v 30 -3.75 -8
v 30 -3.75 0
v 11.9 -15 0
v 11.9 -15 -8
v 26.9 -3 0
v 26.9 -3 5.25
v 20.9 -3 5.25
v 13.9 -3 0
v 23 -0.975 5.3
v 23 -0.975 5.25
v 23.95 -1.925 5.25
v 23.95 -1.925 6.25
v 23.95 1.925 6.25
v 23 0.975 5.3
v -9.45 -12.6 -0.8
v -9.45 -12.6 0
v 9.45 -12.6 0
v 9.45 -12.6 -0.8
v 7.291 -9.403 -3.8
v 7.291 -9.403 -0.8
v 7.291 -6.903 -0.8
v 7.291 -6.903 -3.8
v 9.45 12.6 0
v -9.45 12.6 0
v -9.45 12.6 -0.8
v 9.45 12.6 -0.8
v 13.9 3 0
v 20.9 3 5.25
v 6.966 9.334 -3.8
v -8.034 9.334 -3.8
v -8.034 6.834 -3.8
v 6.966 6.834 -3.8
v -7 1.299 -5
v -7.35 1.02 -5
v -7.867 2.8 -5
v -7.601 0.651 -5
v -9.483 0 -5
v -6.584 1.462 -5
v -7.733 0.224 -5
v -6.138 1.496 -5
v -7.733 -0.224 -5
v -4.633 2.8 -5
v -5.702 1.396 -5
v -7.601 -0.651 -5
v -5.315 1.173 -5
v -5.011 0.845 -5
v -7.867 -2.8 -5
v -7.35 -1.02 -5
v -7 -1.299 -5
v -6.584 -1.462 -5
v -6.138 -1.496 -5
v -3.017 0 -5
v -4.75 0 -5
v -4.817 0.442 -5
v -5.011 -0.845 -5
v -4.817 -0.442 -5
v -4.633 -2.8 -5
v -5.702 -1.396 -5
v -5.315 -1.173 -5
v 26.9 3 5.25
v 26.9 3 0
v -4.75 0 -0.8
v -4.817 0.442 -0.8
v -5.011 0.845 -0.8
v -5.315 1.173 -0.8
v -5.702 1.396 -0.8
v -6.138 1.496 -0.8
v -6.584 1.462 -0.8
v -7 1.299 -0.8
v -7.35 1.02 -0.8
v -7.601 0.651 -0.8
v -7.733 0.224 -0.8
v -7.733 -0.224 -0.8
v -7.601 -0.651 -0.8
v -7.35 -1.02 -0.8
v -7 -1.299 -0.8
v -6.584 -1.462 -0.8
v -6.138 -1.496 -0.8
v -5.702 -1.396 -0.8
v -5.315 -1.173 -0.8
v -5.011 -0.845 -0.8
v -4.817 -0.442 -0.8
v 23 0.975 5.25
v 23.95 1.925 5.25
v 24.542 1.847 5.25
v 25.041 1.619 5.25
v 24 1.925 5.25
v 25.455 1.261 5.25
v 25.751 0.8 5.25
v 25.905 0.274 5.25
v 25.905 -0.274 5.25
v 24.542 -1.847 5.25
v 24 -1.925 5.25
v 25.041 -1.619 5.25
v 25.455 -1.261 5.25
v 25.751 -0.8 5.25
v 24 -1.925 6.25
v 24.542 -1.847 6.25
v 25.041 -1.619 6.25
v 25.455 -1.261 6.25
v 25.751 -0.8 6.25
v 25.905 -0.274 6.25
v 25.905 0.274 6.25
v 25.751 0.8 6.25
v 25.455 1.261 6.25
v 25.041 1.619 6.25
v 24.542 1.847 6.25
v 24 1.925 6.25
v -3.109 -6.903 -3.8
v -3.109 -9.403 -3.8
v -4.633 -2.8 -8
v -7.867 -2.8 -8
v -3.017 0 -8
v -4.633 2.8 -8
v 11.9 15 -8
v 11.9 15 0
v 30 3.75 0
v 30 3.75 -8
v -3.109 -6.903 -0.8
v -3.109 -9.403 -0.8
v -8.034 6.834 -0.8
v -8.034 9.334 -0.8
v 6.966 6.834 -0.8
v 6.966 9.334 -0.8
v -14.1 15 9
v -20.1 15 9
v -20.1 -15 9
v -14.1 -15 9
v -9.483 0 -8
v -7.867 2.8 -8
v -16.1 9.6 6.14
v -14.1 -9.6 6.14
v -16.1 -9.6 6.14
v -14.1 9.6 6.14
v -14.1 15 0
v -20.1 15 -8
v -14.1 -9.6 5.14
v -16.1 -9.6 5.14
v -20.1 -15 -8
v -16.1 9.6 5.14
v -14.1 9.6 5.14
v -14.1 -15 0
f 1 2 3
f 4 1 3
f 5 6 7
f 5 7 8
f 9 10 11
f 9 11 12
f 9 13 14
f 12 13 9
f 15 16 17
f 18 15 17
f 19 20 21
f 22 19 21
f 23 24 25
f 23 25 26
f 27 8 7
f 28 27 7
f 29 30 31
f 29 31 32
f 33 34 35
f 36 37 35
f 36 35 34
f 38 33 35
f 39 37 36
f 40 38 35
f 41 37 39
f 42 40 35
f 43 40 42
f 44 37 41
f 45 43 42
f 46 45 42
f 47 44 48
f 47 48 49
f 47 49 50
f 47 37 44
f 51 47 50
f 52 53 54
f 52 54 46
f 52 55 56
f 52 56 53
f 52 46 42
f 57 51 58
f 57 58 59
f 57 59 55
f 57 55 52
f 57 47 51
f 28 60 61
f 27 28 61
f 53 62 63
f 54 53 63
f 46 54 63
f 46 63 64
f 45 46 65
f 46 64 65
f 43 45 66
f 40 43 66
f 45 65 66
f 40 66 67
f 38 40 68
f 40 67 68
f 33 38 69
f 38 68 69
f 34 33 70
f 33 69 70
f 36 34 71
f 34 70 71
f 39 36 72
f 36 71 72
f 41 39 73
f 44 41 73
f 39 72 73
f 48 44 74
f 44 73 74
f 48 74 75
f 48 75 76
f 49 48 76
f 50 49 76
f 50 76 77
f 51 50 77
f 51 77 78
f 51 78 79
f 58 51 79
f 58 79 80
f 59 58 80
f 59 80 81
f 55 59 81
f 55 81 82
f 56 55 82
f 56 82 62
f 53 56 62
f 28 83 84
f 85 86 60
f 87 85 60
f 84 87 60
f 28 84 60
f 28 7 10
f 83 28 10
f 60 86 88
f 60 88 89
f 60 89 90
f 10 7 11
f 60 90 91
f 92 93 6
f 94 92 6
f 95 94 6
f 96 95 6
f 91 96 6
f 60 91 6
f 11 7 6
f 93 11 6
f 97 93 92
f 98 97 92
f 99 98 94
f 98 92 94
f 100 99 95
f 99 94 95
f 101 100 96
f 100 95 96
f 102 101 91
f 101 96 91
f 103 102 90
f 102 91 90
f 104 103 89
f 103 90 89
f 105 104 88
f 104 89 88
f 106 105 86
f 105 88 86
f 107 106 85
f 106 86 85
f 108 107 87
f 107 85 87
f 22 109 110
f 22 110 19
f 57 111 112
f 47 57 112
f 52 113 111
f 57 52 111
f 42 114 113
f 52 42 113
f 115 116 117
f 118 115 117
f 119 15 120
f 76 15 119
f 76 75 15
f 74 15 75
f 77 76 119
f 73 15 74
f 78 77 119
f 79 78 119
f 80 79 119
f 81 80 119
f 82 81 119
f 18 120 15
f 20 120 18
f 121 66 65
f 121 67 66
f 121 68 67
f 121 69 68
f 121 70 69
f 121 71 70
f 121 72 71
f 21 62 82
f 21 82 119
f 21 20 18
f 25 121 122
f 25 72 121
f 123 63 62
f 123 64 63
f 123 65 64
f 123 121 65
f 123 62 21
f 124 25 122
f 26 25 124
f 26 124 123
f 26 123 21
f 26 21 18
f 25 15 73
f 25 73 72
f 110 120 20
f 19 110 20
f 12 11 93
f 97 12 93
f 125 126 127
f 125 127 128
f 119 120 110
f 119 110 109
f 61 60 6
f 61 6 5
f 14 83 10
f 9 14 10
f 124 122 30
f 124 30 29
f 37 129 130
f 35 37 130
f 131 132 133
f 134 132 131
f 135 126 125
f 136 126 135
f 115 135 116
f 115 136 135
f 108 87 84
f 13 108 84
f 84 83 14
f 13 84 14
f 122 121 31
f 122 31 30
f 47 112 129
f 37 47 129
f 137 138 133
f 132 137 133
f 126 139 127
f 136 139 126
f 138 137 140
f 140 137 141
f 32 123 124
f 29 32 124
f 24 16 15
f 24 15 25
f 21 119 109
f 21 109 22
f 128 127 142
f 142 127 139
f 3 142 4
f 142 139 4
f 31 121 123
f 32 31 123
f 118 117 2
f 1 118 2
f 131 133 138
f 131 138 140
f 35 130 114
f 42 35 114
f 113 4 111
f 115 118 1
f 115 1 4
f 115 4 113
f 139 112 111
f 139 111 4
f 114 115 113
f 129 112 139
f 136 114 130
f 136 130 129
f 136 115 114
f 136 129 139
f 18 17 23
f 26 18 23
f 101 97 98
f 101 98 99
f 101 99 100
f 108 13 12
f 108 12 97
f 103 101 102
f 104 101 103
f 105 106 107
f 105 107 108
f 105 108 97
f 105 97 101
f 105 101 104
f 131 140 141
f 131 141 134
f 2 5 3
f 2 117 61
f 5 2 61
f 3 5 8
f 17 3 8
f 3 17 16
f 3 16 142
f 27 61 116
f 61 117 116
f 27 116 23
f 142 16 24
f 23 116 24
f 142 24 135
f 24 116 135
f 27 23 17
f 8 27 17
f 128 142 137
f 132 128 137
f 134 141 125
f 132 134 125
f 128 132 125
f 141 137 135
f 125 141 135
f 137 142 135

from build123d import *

# Parameters (mm, degrees)
SKETCH_R          = 1.5
PAD_DEPTH         = 8
SKETCH001_W       = 18.9
SKETCH001_H       = 25.2
POCKET_DEPTH      = 0.8
SKETCH002_W       = 15
SKETCH002_H       = 2.5
SKETCH002_W_2     = 10.4
POCKET001_DEPTH   = 3
SKETCH003_W       = 6
SKETCH003_H       = 30
PAD001_DEPTH      = 9
SKETCH004_W       = 19.2
SKETCH004_H       = 1
POCKET002_DEPTH   = 2
POCKET003_DEPTH   = 3
PAD002_DEPTH      = 3
PAD002_DEPTH_BACK = 3
PAD003_DEPTH      = 1
CHAMFER_SIZE      = 0.95


with BuildPart() as part:
    # Sketch → Pad (new body)
    with BuildSketch(Plane.XY):
        Polygon((-20.1, 15), (11.9, 15), (30, 3.75), (30, -3.75), (11.9, -15), (-20.1, -15), align=None)
        with Locations((-6.25, 0)):
            Circle(SKETCH_R, mode=Mode.SUBTRACT)
    extrude(amount=-PAD_DEPTH)

    # Sketch001 → Pocket (cut)
    with BuildSketch(Plane.XY):
        Rectangle(SKETCH001_W, SKETCH001_H)
    extrude(amount=-POCKET_DEPTH, mode=Mode.SUBTRACT)

    # Sketch002 (on Face33 of Pad003) → Pocket001 (cut)
    with BuildSketch(Plane.XY.offset(-0.8)):
        with Locations((-0.534042, 8.083783)):
            Rectangle(SKETCH002_W, SKETCH002_H)
        with Locations((2.090713, -8.153236)):
            Rectangle(SKETCH002_W_2, SKETCH002_H)
    extrude(amount=-POCKET001_DEPTH, mode=Mode.SUBTRACT)

    # Sketch003 (on Face4 of Pocket001) → Pad001 (join)
    with BuildSketch(Plane.XY):
        with Locations((-17.1, 0)):
            Rectangle(SKETCH003_W, SKETCH003_H)
    extrude(amount=PAD001_DEPTH)

    # Sketch004 (on Face10 of Pad001) → Pocket002 (cut)
    with BuildSketch(Plane.YZ.offset(-14.1)):
        with Locations((0, 5.64)):
            Rectangle(SKETCH004_W, SKETCH004_H)
    extrude(amount=-POCKET002_DEPTH, mode=Mode.SUBTRACT)

    # Sketch005 → Pocket003 (cut)
    with BuildSketch(Plane(origin=(0, 0, -8), x_dir=(1, 0, 0), z_dir=(0, 0, -1))):
        Polygon((-4.633419, 2.8), (-7.866581, 2.8), (-9.483162, 0), (-7.866581, -2.8), (-4.633419, -2.8), (-3.016838, 0), align=None)
    extrude(amount=-POCKET003_DEPTH, mode=Mode.SUBTRACT)

    # Sketch006 → Pad002 (join, two sides)
    with BuildSketch(Plane.XZ) as pad002_sk:
        Polygon((13.9, 0), (20.9, 5.25), (26.9, 5.25), (26.9, 0), align=None)
    extrude(amount=PAD002_DEPTH)
    extrude(pad002_sk.sketch, amount=-PAD002_DEPTH_BACK)

    # Sketch007 (on Face32 of Pad002) → Pad003 (join)
    with BuildSketch(Plane.XY.offset(5.25)):
        with BuildLine():
            ThreePointArc((24, -1.925), (25.925, 0), (24, 1.925))
            Line((24, 1.925), (23, 1.925))
            Line((23, 1.925), (23, -1.925))
            Line((23, -1.925), (24, -1.925))
        make_face()
    extrude(amount=PAD003_DEPTH)

    # Chamfer
    chamfer_edges = [part.edges().sort_by_distance(p)[0] for p in [
        (23, 0, 6.25),
        (23, -1.925, 5.75),
        (23, 1.925, 5.75),
    ]]
    chamfer(chamfer_edges, length=CHAMFER_SIZE)


solid = part.part
